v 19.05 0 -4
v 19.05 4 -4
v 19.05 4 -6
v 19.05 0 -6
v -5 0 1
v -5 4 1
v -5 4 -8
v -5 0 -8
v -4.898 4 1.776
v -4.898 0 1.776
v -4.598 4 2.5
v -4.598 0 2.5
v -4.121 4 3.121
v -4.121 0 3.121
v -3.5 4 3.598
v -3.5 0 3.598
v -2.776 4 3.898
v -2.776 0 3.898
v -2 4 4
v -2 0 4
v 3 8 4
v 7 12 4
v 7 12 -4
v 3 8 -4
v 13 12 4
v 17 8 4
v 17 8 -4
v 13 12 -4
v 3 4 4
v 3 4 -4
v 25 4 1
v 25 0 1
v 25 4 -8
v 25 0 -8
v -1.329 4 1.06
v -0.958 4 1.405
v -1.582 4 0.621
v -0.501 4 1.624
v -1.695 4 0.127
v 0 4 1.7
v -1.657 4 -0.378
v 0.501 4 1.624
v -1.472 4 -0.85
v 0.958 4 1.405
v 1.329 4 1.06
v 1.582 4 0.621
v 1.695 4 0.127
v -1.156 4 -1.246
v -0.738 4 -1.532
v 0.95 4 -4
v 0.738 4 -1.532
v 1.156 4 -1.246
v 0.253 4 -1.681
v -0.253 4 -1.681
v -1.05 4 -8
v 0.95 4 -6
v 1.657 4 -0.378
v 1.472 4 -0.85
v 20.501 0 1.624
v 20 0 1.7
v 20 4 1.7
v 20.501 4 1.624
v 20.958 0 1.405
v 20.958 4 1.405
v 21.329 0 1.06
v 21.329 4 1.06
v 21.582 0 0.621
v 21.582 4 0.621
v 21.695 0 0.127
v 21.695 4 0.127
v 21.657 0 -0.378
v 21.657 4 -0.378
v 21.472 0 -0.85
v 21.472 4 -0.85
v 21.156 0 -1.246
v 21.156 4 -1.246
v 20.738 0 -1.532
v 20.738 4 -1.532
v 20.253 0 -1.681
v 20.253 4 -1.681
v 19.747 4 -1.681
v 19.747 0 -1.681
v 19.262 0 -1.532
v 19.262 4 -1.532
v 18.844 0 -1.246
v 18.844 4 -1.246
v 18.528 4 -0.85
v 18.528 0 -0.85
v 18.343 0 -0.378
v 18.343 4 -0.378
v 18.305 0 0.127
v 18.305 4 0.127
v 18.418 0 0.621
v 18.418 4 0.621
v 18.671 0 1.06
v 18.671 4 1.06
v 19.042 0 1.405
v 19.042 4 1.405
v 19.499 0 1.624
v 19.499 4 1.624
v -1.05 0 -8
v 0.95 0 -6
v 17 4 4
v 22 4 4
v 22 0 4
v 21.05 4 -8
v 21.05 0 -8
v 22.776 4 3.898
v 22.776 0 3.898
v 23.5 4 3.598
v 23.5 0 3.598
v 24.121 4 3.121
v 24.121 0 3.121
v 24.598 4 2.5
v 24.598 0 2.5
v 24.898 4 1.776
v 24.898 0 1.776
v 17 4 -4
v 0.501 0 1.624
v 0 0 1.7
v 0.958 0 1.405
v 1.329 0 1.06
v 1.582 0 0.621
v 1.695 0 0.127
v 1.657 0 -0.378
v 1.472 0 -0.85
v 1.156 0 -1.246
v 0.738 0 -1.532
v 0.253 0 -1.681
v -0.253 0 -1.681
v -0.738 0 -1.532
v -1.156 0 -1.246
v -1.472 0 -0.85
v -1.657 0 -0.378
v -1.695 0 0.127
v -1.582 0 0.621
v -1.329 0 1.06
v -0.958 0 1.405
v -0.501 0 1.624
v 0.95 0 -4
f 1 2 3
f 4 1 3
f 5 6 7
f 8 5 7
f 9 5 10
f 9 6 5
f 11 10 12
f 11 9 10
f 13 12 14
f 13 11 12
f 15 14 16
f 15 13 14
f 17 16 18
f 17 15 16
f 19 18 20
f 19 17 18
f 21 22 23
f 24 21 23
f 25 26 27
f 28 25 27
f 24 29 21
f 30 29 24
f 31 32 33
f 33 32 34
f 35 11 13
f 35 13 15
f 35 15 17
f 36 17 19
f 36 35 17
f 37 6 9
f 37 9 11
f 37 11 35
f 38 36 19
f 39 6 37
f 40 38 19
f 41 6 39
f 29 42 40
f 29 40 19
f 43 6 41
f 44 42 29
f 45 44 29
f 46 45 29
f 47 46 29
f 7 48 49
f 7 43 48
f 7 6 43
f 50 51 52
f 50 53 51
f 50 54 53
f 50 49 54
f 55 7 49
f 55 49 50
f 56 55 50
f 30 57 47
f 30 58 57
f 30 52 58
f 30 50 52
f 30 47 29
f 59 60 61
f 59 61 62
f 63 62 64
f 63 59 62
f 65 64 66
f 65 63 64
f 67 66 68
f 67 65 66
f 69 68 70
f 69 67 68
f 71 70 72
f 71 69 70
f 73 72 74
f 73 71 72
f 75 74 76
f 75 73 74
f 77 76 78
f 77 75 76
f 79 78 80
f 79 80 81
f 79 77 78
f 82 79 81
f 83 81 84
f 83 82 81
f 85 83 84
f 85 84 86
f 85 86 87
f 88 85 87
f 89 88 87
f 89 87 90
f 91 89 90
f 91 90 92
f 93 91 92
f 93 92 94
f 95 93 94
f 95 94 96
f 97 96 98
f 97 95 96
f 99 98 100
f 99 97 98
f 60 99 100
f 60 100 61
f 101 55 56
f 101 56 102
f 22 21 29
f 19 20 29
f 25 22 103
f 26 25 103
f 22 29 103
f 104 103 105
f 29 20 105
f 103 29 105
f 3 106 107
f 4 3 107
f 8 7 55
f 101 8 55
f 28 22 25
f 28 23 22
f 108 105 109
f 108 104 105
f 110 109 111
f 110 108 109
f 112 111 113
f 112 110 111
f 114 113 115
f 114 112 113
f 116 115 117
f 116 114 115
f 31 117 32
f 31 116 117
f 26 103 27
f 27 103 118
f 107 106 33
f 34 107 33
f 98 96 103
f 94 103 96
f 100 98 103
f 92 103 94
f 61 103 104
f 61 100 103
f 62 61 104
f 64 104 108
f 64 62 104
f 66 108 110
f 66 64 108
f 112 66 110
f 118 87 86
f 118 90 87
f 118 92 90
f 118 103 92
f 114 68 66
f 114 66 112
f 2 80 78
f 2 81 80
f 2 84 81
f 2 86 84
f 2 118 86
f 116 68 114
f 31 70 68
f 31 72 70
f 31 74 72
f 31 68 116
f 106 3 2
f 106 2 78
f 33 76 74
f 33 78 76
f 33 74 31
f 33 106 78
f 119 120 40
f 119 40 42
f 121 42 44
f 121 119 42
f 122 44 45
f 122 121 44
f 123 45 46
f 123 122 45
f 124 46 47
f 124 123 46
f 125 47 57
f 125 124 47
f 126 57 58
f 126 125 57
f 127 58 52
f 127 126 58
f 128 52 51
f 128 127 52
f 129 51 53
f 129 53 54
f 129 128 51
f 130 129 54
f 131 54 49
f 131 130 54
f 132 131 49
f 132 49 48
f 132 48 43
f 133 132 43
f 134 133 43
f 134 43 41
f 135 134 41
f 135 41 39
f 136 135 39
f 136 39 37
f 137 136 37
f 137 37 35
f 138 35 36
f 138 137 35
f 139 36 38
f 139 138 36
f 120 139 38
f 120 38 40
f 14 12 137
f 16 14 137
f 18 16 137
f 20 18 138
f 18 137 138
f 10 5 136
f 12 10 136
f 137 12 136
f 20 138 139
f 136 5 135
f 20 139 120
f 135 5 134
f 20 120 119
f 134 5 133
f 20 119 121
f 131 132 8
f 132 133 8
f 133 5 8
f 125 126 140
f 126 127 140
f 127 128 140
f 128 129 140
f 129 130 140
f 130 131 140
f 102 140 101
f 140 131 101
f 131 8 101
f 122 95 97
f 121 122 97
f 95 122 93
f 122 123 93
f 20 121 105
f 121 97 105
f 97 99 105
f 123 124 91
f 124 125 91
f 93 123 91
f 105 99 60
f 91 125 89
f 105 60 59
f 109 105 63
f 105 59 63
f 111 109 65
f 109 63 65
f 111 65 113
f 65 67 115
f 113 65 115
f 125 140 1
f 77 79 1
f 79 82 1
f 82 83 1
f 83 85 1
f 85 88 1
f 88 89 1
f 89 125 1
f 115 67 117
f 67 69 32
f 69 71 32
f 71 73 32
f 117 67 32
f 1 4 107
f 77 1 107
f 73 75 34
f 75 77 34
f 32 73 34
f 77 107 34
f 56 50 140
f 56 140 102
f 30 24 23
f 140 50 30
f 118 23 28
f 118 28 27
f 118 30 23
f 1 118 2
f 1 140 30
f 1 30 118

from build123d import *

# Parameters (mm, degrees)
SKETCH1_W           = 30
SKETCH1_H           = 8
SKETCH1_R           = 1.7
BOSS_EXTRUDE1_DEPTH = 4
FILLET1_R           = 3
SKETCH2_W           = 5.95
SKETCH2_H           = 4
BOSS_EXTRUDE2_DEPTH = 4
SKETCH3_W           = 14
SKETCH3_H           = 8
BOSS_EXTRUDE3_DEPTH = 8
CHAMFER1_SIZE       = 4
CHAMFER2_SIZE       = 2


with BuildPart() as part:
    # Sketch1 → Boss-Extrude1 (new body)
    with BuildSketch(Plane(origin=(0, 0, 0), x_dir=(1, 0, 0), z_dir=(0, 1, 0))):
        with Locations((10, 0)):
            Rectangle(SKETCH1_W, SKETCH1_H)
        with Locations(Location((0, 0, 0), (0, 0, 270))):
            Circle(SKETCH1_R, mode=Mode.SUBTRACT)
        with Locations(Location((20, 0, 0), (0, 0, 270))):
            Circle(SKETCH1_R, mode=Mode.SUBTRACT)
    extrude(amount=BOSS_EXTRUDE1_DEPTH)

    # Fillet1
    fillet1_edges = [part.edges().sort_by_distance(p)[0] for p in [
        (25, 2, 4),
        (-5, 2, 4),
    ]]
    fillet(fillet1_edges, radius=FILLET1_R)

    # Sketch2 → Boss-Extrude2 (add)
    with BuildSketch(Plane(origin=(0, 4, 0), x_dir=(1, 0, 0), z_dir=(0, 1, 0))):
        with Locations((-2.025, 6)):
            Rectangle(SKETCH2_W, SKETCH2_H)
        with Locations((22.025, 6)):
            Rectangle(SKETCH2_W, SKETCH2_H)
    extrude(amount=-BOSS_EXTRUDE2_DEPTH)

    # Sketch3 → Boss-Extrude3 (add)
    with BuildSketch(Plane(origin=(0, 4, 0), x_dir=(1, 0, 0), z_dir=(0, 1, 0))):
        with Locations((10, 0)):
            Rectangle(SKETCH3_W, SKETCH3_H)
    extrude(amount=BOSS_EXTRUDE3_DEPTH)

    # Chamfer1
    chamfer1_edges = [part.edges().sort_by_distance(p)[0] for p in [
        (17, 12, 0),
        (3, 12, 0),
    ]]
    chamfer(chamfer1_edges, length=CHAMFER1_SIZE)

    # Chamfer2
    chamfer2_edges = [part.edges().sort_by_distance(p)[0] for p in [
        (0.95, 2, -8),
        (19.05, 2, -8),
    ]]
    chamfer(chamfer2_edges, length=CHAMFER2_SIZE)


solid = part.part
